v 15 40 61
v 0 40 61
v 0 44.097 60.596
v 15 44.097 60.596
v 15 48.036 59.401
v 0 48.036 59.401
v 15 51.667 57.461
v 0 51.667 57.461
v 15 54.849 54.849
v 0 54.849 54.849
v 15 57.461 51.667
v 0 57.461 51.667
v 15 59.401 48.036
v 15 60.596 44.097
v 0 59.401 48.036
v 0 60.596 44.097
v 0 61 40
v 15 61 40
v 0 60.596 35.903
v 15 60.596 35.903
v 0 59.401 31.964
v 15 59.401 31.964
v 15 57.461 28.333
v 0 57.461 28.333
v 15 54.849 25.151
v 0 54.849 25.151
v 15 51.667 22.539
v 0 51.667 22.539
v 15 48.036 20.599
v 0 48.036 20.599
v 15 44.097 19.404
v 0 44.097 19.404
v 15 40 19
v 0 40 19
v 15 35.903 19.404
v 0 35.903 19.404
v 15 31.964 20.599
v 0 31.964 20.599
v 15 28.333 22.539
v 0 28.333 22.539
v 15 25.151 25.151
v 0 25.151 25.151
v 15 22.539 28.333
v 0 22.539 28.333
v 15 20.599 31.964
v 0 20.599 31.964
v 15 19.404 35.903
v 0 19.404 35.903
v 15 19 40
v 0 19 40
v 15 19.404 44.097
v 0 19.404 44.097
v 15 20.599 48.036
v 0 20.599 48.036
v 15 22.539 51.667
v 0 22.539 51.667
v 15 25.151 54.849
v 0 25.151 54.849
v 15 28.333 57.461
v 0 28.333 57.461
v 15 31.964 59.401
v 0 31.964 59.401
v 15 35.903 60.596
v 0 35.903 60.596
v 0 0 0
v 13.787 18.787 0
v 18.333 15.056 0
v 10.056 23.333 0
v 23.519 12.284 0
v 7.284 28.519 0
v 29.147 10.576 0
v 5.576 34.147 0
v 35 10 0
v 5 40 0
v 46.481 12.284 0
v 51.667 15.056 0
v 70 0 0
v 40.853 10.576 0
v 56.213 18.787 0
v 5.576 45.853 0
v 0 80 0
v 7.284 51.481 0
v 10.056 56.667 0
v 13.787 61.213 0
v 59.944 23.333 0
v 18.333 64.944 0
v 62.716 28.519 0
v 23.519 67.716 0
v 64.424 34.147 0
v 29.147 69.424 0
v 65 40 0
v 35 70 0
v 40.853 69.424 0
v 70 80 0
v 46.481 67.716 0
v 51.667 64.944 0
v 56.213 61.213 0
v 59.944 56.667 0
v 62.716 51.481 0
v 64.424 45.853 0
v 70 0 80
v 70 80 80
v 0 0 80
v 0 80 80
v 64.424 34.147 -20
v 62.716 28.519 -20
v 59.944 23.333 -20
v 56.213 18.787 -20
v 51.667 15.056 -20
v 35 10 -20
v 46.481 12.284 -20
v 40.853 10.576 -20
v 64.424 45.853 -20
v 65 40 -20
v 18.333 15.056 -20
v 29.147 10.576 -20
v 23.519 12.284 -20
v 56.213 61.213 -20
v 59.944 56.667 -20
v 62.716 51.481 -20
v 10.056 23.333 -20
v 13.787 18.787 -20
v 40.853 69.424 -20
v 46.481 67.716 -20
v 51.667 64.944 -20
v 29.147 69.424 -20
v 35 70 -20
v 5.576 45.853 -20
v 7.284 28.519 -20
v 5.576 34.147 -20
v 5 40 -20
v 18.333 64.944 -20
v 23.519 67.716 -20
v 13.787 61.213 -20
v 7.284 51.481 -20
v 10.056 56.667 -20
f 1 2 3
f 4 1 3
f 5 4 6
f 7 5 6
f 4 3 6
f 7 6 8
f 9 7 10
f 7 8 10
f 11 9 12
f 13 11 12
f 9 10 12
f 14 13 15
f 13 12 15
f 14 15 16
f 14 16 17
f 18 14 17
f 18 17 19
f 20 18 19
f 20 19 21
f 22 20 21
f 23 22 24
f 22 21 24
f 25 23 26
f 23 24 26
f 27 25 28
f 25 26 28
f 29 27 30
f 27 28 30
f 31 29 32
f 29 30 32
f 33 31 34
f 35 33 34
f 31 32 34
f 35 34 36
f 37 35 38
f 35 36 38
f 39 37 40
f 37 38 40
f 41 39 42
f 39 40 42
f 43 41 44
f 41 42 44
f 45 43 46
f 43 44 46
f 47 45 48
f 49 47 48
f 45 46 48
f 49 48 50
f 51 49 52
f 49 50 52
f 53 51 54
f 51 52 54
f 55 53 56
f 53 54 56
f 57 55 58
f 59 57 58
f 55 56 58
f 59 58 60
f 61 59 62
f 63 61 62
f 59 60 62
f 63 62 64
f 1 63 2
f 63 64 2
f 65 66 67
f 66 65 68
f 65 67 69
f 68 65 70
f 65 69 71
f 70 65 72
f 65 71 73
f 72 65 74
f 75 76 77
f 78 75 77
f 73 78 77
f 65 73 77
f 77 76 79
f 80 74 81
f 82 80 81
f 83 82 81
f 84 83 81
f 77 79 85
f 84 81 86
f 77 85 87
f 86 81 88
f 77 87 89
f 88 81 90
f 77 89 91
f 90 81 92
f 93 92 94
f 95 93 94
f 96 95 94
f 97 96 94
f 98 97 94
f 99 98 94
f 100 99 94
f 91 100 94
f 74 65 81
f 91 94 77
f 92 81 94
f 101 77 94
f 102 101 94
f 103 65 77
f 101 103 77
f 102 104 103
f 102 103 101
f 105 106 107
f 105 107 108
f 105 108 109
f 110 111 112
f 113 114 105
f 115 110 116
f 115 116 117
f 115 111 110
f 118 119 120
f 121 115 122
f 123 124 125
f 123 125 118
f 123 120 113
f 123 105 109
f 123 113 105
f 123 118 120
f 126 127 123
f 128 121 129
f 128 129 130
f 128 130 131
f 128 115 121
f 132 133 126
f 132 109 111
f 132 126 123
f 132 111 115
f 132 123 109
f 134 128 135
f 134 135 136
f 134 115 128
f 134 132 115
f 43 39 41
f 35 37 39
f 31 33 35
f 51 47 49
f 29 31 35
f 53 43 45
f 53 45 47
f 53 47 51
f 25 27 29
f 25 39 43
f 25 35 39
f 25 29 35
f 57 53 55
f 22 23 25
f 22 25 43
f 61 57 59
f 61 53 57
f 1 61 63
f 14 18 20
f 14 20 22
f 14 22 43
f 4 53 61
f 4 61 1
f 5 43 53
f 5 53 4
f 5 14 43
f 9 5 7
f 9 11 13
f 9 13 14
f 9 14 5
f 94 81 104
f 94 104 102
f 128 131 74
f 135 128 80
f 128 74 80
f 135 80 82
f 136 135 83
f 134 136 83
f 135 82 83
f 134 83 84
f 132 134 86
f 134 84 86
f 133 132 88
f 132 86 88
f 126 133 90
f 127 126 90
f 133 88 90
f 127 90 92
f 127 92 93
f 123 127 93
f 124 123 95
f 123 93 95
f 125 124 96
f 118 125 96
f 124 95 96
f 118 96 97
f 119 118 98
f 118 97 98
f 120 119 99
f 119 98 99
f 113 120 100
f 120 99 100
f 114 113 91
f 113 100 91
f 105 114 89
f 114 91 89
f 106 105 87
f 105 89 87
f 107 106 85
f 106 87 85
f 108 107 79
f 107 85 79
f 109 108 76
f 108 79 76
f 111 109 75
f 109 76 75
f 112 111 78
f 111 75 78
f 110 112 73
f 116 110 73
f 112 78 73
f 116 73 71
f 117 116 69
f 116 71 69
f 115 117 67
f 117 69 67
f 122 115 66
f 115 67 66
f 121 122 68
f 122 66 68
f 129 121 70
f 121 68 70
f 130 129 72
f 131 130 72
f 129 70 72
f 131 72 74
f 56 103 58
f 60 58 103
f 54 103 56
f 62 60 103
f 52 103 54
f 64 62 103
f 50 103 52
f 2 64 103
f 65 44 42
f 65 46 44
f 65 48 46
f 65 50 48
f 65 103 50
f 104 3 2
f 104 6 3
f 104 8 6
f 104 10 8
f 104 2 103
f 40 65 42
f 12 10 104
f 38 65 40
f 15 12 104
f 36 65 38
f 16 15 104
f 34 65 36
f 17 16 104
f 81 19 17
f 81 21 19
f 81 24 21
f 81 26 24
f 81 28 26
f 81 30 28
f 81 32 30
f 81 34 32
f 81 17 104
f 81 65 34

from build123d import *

# Parameters (mm, degrees)
CROQUIS1_W              = 70
CROQUIS1_H              = 80
SALIENTE_EXTRUIR1_DEPTH = 80
CROQUIS2_R              = 30
SALIENTE_EXTRUIR2_DEPTH = 20
CROQUIS3_R              = 21
CORTAR_EXTRUIR1_DEPTH   = 15


with BuildPart() as part:
    # Croquis1 → Saliente-Extruir1 (new body)
    with BuildSketch(Plane.XY):
        with Locations((35, 40)):
            Rectangle(CROQUIS1_W, CROQUIS1_H)
    extrude(amount=SALIENTE_EXTRUIR1_DEPTH)

    # Croquis2 → Saliente-Extruir2 (add)
    with BuildSketch(Plane(origin=(0, 0, 0), x_dir=(-1, 0, 0), z_dir=(0, 0, -1))):
        with Locations((-35, 40)):
            Circle(CROQUIS2_R)
    extrude(amount=SALIENTE_EXTRUIR2_DEPTH)

    # Croquis3 → Cortar-Extruir1 (cut)
    with BuildSketch(Plane.ZY):
        with Locations((40, 40)):
            Circle(CROQUIS3_R)
    extrude(amount=-CORTAR_EXTRUIR1_DEPTH, mode=Mode.SUBTRACT)


solid = part.part
